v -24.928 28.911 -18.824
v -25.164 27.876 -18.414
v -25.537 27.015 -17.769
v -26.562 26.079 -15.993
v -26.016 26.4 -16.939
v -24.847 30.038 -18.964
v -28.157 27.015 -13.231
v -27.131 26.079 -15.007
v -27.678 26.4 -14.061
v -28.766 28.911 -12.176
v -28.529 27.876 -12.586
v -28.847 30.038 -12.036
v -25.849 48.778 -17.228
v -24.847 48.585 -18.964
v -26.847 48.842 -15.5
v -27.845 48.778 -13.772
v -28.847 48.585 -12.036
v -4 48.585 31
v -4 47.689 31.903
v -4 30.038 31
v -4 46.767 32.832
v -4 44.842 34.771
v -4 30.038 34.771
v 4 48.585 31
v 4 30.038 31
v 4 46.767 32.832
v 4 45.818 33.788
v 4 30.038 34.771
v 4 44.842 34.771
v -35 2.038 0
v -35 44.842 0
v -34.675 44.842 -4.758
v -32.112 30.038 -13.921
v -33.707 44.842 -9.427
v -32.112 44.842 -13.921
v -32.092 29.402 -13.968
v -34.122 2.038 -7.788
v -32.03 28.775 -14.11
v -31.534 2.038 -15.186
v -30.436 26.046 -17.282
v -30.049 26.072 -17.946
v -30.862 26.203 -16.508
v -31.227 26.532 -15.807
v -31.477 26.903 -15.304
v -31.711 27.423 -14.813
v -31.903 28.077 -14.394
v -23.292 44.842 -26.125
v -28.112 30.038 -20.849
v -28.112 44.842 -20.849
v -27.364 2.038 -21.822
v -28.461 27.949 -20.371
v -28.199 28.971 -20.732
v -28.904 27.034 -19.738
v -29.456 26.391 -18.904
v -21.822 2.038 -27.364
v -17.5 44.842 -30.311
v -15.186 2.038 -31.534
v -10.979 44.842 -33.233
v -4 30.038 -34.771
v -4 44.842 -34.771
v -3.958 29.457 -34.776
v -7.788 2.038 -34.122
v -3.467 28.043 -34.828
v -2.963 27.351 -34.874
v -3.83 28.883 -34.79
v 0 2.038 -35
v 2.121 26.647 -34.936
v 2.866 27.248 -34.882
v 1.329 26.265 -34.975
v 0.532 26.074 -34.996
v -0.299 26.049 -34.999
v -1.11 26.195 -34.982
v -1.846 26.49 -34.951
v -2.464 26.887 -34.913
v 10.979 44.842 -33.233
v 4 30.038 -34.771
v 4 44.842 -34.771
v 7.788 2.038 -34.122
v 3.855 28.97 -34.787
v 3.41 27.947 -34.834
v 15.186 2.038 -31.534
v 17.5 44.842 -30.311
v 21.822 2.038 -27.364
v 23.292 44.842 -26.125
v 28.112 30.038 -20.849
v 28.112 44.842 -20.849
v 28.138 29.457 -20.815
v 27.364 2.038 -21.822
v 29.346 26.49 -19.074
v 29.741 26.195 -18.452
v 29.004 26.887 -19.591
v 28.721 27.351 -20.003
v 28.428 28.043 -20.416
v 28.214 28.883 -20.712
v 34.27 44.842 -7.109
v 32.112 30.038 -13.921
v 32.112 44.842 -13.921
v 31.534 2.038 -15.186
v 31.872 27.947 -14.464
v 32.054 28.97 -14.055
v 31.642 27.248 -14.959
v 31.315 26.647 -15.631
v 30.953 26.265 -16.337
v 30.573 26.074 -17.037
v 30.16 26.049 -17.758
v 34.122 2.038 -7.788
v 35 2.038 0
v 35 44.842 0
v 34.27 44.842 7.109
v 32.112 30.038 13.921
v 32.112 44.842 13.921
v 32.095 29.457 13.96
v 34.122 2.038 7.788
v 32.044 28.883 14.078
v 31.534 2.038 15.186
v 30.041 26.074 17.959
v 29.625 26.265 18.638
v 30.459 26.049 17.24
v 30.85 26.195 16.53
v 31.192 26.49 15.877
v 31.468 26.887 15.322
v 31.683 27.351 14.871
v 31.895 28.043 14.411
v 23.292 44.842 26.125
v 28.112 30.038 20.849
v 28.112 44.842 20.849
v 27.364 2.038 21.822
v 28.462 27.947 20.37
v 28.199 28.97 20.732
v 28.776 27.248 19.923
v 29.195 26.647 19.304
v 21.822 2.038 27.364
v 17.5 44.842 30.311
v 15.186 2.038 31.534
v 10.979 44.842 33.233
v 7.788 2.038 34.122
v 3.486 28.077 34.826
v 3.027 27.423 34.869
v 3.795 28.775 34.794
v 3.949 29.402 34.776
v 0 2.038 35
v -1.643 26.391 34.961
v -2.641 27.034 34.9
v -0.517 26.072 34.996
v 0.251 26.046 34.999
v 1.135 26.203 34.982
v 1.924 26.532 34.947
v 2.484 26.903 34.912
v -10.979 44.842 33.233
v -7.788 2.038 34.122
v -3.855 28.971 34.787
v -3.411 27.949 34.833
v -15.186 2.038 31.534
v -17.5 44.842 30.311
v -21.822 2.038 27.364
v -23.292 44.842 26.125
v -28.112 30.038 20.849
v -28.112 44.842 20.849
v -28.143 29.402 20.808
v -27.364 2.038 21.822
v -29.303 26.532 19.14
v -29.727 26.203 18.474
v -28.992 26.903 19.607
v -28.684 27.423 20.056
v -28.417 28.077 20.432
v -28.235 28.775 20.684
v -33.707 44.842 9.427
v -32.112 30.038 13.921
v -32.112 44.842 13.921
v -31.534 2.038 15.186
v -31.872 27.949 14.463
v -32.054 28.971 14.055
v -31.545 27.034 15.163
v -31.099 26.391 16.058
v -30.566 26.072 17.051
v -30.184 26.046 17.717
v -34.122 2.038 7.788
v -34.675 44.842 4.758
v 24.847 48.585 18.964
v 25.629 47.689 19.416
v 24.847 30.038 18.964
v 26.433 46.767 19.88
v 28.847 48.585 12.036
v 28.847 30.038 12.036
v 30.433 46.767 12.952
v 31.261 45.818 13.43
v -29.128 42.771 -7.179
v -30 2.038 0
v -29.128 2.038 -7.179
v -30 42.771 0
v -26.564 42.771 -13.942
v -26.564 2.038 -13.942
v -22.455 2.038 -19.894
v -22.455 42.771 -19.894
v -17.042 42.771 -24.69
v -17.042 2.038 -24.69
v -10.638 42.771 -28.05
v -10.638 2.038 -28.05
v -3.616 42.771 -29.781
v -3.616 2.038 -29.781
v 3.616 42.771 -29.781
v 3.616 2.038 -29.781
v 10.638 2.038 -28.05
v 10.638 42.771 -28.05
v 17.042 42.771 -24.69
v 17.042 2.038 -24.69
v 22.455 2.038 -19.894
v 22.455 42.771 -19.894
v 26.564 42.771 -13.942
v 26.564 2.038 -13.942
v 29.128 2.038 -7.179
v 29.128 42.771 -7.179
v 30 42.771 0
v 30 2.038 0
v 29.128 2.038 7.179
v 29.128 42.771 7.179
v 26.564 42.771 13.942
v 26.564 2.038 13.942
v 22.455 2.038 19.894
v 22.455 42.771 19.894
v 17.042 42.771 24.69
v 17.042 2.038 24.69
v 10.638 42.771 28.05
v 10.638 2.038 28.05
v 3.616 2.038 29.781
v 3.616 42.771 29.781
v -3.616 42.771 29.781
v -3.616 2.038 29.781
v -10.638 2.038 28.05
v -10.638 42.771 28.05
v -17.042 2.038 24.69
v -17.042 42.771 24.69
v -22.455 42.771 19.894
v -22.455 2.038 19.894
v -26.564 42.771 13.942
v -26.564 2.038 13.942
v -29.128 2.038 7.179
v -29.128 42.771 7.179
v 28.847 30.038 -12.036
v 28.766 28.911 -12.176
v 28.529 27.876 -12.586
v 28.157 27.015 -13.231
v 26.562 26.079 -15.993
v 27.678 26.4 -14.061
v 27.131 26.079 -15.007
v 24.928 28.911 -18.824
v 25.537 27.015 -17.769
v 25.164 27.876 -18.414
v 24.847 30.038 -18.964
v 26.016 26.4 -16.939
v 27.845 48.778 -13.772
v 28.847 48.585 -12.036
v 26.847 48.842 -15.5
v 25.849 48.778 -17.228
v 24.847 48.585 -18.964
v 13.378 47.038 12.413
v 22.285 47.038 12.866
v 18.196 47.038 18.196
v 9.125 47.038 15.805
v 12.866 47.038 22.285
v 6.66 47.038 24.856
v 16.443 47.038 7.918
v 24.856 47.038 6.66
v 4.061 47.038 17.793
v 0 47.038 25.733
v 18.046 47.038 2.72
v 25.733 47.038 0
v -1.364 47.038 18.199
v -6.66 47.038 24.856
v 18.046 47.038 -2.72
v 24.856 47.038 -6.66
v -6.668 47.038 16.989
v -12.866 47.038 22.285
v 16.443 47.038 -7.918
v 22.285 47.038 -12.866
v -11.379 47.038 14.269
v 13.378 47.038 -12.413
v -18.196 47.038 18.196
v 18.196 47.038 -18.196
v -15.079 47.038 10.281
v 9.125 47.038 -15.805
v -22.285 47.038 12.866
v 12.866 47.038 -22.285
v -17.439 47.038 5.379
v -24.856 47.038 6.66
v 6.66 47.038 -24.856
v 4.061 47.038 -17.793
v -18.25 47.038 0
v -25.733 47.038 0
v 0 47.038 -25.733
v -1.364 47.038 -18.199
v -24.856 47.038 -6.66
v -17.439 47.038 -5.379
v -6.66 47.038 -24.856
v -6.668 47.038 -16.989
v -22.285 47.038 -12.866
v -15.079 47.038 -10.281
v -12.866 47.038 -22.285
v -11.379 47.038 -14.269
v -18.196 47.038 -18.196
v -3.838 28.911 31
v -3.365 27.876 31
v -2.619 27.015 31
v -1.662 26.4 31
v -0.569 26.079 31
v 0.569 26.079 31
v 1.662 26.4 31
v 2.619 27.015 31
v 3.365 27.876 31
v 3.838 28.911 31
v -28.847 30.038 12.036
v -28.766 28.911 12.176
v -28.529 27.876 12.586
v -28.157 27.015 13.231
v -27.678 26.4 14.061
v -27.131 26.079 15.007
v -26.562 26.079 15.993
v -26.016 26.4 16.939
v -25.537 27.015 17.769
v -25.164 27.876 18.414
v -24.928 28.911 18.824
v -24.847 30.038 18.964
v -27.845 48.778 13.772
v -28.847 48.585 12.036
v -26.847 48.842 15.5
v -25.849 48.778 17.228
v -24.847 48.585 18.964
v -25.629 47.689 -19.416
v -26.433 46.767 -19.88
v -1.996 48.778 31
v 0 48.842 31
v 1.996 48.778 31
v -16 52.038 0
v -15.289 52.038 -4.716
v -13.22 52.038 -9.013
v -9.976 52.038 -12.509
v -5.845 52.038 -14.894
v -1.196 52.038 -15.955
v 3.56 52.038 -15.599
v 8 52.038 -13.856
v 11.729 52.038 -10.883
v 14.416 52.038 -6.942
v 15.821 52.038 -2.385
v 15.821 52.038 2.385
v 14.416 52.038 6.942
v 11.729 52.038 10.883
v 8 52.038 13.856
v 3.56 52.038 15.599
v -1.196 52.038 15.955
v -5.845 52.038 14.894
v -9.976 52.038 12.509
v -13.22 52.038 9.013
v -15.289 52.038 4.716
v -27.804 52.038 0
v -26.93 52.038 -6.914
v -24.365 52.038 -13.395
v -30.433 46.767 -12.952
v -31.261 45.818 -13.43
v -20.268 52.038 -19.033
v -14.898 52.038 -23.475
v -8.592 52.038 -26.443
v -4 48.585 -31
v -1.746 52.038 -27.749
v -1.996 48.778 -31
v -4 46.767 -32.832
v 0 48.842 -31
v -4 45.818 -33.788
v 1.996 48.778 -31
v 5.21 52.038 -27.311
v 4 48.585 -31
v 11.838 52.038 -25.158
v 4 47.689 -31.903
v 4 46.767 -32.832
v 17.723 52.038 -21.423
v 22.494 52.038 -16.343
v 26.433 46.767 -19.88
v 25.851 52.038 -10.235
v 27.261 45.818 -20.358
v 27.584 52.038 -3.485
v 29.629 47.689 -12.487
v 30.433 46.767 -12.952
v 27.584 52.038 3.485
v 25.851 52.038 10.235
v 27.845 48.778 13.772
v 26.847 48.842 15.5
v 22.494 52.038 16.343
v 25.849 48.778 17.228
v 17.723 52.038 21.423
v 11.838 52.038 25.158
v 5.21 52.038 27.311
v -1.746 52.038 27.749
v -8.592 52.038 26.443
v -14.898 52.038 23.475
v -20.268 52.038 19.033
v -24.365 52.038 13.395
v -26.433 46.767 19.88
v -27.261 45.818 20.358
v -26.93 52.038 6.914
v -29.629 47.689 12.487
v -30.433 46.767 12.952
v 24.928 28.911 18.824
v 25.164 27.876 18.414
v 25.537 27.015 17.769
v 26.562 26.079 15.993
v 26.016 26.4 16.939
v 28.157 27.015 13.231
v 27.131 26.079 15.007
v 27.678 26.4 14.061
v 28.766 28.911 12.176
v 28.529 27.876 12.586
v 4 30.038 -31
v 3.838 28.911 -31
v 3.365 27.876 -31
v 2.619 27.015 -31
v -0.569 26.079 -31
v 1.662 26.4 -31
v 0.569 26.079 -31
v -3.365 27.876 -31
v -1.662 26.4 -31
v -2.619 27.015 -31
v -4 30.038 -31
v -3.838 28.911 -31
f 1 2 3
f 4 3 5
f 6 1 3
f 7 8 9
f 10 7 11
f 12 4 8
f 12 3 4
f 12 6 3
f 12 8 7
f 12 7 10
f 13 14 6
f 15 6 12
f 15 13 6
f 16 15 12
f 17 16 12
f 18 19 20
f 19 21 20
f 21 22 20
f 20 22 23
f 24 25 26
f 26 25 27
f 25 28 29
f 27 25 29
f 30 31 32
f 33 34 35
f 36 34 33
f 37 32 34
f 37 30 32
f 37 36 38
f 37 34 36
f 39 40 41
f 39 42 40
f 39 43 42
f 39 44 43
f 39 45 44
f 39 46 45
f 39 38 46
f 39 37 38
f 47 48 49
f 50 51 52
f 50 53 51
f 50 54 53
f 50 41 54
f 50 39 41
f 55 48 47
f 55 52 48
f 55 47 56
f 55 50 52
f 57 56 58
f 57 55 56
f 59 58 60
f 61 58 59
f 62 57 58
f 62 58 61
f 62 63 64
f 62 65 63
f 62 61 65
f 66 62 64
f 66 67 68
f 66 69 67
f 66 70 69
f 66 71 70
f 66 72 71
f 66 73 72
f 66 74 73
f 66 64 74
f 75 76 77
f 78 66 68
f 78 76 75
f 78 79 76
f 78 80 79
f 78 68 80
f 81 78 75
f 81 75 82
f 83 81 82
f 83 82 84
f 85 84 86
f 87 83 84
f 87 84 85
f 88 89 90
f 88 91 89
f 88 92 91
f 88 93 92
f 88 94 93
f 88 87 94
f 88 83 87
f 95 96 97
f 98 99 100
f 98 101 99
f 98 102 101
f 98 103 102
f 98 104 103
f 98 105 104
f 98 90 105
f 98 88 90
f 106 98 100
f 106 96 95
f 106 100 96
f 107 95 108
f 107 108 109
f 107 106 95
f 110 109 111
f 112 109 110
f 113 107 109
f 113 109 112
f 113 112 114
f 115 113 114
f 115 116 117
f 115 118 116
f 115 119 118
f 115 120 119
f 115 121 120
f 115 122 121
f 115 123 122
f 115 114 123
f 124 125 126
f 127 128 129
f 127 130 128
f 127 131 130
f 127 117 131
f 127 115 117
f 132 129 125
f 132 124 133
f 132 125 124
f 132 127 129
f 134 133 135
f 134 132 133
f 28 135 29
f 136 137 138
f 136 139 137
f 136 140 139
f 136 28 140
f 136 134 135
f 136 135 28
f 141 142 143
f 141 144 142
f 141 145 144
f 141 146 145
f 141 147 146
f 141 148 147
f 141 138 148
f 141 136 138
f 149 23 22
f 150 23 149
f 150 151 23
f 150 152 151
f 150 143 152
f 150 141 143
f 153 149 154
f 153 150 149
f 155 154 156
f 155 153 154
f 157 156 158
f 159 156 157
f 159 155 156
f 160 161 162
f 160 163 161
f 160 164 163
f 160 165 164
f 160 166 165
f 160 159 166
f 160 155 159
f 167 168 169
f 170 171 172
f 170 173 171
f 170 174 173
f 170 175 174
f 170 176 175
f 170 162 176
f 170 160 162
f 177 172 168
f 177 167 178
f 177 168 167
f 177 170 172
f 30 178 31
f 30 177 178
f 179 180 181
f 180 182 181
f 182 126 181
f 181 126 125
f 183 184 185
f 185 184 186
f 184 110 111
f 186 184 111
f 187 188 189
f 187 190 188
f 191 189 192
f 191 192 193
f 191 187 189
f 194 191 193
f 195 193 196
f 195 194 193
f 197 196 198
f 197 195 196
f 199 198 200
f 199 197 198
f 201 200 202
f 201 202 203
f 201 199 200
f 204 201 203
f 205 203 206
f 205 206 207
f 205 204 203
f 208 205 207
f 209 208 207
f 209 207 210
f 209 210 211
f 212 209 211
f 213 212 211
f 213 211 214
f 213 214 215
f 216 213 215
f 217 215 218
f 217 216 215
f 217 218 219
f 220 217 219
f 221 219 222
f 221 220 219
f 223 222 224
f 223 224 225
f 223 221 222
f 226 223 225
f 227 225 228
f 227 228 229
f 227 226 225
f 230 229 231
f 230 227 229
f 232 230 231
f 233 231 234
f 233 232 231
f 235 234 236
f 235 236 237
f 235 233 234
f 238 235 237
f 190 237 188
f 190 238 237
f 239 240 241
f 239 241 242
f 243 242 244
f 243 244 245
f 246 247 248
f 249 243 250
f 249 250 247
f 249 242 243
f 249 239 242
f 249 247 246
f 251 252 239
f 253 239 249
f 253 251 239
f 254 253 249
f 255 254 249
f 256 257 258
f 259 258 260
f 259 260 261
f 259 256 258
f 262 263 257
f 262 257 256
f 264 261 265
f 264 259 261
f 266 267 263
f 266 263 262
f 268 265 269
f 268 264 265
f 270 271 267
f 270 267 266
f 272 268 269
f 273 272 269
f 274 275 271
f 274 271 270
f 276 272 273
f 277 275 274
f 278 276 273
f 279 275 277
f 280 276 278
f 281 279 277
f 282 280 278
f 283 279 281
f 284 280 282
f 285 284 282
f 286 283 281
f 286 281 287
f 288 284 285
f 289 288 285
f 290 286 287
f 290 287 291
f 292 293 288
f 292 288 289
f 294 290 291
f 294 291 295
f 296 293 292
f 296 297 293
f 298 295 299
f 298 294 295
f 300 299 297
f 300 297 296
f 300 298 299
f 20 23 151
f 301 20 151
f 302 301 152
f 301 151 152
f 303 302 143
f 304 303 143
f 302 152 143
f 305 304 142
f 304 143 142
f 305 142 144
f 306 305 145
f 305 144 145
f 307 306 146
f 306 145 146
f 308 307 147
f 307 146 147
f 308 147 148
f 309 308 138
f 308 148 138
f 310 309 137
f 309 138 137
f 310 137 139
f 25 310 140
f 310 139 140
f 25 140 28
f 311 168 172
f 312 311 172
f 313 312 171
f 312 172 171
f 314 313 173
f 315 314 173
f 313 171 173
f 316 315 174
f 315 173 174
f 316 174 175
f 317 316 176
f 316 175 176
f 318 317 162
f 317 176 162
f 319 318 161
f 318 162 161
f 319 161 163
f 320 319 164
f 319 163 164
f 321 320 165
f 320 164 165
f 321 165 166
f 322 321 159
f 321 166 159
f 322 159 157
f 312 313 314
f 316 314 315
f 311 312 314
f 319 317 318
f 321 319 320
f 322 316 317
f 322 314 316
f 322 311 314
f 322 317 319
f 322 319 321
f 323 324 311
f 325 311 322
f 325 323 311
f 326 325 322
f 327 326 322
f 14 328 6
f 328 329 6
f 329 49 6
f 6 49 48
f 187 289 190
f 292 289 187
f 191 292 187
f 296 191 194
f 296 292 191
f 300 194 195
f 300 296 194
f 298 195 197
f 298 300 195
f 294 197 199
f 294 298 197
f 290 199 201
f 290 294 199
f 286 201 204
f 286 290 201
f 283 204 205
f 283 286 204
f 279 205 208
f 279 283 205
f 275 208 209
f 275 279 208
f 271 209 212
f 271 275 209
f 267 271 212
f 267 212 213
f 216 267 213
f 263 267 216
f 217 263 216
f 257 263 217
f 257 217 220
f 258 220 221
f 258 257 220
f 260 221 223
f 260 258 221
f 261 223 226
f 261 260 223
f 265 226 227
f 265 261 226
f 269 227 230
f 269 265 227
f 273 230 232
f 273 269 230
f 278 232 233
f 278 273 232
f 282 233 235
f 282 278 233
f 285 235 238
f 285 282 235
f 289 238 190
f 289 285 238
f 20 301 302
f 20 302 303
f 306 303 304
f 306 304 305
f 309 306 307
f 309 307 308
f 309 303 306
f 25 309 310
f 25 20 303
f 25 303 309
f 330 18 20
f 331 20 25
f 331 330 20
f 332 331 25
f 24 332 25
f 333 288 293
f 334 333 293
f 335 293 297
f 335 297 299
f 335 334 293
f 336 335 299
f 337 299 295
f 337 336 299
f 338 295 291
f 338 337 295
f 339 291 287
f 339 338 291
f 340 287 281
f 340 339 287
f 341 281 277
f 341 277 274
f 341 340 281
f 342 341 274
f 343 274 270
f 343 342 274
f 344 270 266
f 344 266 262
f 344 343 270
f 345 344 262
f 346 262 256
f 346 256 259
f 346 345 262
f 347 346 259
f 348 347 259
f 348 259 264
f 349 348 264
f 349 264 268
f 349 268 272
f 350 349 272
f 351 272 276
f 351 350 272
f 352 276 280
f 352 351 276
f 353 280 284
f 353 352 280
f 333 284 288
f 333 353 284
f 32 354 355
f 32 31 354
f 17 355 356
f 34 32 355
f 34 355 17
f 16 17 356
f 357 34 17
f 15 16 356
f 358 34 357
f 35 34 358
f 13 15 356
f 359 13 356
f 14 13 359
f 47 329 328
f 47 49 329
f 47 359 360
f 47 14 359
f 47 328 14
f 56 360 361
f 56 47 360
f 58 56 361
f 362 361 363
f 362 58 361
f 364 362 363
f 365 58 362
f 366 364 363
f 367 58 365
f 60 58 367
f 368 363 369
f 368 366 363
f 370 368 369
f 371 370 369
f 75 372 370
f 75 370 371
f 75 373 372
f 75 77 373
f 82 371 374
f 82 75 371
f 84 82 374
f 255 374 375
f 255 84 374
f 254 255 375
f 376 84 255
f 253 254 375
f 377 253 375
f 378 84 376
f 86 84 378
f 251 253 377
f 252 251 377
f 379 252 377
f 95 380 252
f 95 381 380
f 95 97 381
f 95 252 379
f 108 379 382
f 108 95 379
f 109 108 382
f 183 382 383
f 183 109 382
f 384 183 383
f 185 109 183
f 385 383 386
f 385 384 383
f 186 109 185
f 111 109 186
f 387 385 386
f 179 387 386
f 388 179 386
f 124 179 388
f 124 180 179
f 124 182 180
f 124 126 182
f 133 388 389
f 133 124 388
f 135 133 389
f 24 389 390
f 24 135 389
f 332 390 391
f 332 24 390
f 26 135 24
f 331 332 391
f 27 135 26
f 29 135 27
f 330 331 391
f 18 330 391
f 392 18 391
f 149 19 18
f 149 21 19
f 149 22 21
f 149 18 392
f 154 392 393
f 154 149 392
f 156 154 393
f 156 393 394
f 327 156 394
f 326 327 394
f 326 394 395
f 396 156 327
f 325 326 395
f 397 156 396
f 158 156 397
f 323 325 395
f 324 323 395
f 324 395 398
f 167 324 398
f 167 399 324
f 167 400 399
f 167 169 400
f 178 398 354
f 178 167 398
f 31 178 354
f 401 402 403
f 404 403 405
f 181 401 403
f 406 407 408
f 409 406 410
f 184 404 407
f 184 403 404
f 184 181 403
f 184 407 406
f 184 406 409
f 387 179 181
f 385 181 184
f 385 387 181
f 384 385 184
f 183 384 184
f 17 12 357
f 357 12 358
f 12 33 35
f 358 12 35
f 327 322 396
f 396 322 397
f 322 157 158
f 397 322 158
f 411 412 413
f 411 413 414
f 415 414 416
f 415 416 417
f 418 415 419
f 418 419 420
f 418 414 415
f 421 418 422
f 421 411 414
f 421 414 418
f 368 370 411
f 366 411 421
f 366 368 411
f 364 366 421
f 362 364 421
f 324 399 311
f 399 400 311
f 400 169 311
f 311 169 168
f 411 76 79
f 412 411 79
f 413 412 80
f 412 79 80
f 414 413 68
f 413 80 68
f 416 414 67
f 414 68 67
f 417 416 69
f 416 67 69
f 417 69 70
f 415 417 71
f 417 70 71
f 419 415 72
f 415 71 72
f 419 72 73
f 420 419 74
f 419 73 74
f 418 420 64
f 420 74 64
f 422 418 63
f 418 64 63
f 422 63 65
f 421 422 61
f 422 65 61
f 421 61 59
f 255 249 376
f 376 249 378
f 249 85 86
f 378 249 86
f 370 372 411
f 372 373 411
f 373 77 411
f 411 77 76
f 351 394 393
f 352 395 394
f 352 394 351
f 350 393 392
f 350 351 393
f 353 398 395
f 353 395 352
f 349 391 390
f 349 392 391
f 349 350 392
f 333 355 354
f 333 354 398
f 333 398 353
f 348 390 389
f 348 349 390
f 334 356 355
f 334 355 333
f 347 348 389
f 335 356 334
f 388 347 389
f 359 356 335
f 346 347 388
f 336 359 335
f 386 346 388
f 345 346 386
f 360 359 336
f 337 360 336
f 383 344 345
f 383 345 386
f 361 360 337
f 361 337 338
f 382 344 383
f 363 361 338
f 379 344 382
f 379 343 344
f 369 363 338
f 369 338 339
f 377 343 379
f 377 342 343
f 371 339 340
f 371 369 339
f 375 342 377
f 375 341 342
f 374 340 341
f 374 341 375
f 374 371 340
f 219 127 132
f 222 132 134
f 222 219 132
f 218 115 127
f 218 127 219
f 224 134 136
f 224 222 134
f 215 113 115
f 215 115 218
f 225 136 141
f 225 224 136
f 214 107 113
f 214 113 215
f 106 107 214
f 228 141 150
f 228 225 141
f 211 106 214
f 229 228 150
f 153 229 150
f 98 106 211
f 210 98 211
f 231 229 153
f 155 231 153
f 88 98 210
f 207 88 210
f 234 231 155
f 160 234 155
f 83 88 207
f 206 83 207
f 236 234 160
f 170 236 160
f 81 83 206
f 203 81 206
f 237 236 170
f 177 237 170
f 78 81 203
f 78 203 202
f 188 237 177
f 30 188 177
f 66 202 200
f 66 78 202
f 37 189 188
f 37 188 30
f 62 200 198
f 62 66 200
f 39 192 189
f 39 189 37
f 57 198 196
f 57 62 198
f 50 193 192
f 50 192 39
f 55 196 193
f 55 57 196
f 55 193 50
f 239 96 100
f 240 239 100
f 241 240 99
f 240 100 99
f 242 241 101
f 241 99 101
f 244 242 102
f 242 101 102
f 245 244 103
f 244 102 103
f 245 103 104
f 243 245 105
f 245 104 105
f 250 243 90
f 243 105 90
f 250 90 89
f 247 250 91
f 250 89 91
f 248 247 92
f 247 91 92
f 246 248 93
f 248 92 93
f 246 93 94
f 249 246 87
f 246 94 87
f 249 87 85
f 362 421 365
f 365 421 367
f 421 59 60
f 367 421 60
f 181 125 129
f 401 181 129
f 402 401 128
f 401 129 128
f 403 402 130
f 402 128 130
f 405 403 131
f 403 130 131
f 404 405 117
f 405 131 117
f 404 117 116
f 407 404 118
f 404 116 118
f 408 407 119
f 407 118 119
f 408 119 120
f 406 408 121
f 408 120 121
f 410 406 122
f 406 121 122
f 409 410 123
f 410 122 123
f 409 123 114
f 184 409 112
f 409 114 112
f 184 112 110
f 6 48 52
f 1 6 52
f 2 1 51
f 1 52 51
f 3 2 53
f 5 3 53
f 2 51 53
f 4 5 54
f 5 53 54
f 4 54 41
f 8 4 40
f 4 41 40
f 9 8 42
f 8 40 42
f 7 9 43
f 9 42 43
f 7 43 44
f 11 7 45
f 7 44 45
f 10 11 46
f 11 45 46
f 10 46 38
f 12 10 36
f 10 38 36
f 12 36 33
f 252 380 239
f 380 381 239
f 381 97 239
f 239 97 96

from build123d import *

# Parameters (mm, degrees)
CUT_EXTRUDE_4_DEPTH      = 9
PATTERN_CIRCULAR_1_COUNT = 6


with BuildPart() as part:
    # 草图1 → 旋转1 (revolve)
    with BuildSketch(Plane.XY):
        Polygon((-16, 52.038271605), (-27.803703704, 52.038271605), (-35, 44.841975309), (-35, 2.038271605), (-30, 2.038271605), (-30, 42.770907497), (-25.732635892, 47.038271605), (-18.250236606, 47.038271605), align=None)
    revolve(axis=Axis((0, 88.586419753, 0), (0, -1, 0)))

    # 草图2 → 切除-拉伸4 (cut)
    with BuildSketch(Plane.XY.offset(40)):
        with BuildLine():
            Line((-4, 52.038271605), (-4, 30.038271605))
            ThreePointArc((-4, 30.038271605), (0, 26.038271605), (4, 30.038271605))
            Line((4, 30.038271605), (4, 52.038271605))
            Line((4, 52.038271605), (-4, 52.038271605))
        make_face()
    cut_extrude_4 = extrude(amount=-CUT_EXTRUDE_4_DEPTH, mode=Mode.SUBTRACT)

    # 阵列(圆周)1: 切除-拉伸4 ×6 about axis
    pattern_circular_1_axis = Axis((0, 0, 0), (0, 1, 0))
    for i in range(1, PATTERN_CIRCULAR_1_COUNT):
        add(cut_extrude_4.rotate(pattern_circular_1_axis, i * 360 / PATTERN_CIRCULAR_1_COUNT), mode=Mode.SUBTRACT)


solid = part.part
